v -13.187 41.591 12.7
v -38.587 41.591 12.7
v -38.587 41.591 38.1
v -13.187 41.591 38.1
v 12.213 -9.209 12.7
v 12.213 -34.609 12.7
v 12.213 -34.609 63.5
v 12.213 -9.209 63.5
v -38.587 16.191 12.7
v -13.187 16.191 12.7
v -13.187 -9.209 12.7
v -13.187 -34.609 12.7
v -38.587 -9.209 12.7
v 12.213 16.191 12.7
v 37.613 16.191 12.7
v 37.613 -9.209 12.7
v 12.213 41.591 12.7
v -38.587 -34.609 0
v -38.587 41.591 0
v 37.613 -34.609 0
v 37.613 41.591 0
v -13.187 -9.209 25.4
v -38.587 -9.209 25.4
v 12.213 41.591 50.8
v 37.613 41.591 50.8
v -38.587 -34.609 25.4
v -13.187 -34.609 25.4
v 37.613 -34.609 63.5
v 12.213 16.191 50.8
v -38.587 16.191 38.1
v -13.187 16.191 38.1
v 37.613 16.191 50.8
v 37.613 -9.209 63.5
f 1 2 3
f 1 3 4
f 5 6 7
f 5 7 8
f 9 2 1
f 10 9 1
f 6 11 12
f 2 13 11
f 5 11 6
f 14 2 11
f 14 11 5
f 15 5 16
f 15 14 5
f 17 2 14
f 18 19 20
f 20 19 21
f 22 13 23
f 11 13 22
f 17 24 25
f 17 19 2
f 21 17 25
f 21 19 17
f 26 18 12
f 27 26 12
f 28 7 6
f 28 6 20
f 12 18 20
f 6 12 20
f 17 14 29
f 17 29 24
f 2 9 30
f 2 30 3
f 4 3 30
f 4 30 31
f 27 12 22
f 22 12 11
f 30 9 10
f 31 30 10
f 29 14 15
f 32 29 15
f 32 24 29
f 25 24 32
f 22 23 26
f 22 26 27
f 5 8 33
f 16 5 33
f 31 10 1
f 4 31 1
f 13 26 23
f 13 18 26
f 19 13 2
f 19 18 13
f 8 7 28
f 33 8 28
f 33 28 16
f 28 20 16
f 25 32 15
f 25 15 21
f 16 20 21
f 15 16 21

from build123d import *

# Parameters (mm, degrees)
F0_W     = 76.2
F0_H     = 76.2
F1_DEPTH = 12.7
F2_W     = 25.4
F2_H     = 25.4
F3_DEPTH = 12.7
F4_W     = 25.4
F4_H     = 25.4
F5_DEPTH = 25.4
F6_W     = 25.4
F6_H     = 25.4
F7_DEPTH = 38.1
F8_W     = 25.4
F8_H     = 25.4
F9_DEPTH = 50.8


with BuildPart() as f1:
    # F0 (on Top) → F1 (new body)
    with BuildSketch(Plane.XY):
        with Locations((-0.486679, 3.491431)):
            Rectangle(F0_W, F0_H)
    extrude(amount=F1_DEPTH)

    # F2 (on face) → F3 (join)
    with BuildSketch(Plane.XY.offset(12.7)):
        with Locations((-25.886679, -21.908569)):
            Rectangle(F2_W, F2_H)
    extrude(amount=F3_DEPTH)

    # F6 (on face) → F7 (join)
    with BuildSketch(Plane.XY.offset(12.7)):
        with Locations((24.913321, 28.891431)):
            Rectangle(F6_W, F6_H)
    extrude(amount=F7_DEPTH)

    # F8 (on face) → F9 (join)
    with BuildSketch(Plane.XY.offset(12.7)):
        with Locations((24.913321, -21.908569)):
            Rectangle(F8_W, F8_H)
    extrude(amount=F9_DEPTH)


with BuildPart() as f5:
    # F4 (on face) → F5 (new body)
    with BuildSketch(Plane.XY.offset(12.7)):
        with Locations((-25.886679, 28.891431)):
            Rectangle(F4_W, F4_H)
    extrude(amount=F5_DEPTH)


solid = Compound([f1.part, f5.part])
